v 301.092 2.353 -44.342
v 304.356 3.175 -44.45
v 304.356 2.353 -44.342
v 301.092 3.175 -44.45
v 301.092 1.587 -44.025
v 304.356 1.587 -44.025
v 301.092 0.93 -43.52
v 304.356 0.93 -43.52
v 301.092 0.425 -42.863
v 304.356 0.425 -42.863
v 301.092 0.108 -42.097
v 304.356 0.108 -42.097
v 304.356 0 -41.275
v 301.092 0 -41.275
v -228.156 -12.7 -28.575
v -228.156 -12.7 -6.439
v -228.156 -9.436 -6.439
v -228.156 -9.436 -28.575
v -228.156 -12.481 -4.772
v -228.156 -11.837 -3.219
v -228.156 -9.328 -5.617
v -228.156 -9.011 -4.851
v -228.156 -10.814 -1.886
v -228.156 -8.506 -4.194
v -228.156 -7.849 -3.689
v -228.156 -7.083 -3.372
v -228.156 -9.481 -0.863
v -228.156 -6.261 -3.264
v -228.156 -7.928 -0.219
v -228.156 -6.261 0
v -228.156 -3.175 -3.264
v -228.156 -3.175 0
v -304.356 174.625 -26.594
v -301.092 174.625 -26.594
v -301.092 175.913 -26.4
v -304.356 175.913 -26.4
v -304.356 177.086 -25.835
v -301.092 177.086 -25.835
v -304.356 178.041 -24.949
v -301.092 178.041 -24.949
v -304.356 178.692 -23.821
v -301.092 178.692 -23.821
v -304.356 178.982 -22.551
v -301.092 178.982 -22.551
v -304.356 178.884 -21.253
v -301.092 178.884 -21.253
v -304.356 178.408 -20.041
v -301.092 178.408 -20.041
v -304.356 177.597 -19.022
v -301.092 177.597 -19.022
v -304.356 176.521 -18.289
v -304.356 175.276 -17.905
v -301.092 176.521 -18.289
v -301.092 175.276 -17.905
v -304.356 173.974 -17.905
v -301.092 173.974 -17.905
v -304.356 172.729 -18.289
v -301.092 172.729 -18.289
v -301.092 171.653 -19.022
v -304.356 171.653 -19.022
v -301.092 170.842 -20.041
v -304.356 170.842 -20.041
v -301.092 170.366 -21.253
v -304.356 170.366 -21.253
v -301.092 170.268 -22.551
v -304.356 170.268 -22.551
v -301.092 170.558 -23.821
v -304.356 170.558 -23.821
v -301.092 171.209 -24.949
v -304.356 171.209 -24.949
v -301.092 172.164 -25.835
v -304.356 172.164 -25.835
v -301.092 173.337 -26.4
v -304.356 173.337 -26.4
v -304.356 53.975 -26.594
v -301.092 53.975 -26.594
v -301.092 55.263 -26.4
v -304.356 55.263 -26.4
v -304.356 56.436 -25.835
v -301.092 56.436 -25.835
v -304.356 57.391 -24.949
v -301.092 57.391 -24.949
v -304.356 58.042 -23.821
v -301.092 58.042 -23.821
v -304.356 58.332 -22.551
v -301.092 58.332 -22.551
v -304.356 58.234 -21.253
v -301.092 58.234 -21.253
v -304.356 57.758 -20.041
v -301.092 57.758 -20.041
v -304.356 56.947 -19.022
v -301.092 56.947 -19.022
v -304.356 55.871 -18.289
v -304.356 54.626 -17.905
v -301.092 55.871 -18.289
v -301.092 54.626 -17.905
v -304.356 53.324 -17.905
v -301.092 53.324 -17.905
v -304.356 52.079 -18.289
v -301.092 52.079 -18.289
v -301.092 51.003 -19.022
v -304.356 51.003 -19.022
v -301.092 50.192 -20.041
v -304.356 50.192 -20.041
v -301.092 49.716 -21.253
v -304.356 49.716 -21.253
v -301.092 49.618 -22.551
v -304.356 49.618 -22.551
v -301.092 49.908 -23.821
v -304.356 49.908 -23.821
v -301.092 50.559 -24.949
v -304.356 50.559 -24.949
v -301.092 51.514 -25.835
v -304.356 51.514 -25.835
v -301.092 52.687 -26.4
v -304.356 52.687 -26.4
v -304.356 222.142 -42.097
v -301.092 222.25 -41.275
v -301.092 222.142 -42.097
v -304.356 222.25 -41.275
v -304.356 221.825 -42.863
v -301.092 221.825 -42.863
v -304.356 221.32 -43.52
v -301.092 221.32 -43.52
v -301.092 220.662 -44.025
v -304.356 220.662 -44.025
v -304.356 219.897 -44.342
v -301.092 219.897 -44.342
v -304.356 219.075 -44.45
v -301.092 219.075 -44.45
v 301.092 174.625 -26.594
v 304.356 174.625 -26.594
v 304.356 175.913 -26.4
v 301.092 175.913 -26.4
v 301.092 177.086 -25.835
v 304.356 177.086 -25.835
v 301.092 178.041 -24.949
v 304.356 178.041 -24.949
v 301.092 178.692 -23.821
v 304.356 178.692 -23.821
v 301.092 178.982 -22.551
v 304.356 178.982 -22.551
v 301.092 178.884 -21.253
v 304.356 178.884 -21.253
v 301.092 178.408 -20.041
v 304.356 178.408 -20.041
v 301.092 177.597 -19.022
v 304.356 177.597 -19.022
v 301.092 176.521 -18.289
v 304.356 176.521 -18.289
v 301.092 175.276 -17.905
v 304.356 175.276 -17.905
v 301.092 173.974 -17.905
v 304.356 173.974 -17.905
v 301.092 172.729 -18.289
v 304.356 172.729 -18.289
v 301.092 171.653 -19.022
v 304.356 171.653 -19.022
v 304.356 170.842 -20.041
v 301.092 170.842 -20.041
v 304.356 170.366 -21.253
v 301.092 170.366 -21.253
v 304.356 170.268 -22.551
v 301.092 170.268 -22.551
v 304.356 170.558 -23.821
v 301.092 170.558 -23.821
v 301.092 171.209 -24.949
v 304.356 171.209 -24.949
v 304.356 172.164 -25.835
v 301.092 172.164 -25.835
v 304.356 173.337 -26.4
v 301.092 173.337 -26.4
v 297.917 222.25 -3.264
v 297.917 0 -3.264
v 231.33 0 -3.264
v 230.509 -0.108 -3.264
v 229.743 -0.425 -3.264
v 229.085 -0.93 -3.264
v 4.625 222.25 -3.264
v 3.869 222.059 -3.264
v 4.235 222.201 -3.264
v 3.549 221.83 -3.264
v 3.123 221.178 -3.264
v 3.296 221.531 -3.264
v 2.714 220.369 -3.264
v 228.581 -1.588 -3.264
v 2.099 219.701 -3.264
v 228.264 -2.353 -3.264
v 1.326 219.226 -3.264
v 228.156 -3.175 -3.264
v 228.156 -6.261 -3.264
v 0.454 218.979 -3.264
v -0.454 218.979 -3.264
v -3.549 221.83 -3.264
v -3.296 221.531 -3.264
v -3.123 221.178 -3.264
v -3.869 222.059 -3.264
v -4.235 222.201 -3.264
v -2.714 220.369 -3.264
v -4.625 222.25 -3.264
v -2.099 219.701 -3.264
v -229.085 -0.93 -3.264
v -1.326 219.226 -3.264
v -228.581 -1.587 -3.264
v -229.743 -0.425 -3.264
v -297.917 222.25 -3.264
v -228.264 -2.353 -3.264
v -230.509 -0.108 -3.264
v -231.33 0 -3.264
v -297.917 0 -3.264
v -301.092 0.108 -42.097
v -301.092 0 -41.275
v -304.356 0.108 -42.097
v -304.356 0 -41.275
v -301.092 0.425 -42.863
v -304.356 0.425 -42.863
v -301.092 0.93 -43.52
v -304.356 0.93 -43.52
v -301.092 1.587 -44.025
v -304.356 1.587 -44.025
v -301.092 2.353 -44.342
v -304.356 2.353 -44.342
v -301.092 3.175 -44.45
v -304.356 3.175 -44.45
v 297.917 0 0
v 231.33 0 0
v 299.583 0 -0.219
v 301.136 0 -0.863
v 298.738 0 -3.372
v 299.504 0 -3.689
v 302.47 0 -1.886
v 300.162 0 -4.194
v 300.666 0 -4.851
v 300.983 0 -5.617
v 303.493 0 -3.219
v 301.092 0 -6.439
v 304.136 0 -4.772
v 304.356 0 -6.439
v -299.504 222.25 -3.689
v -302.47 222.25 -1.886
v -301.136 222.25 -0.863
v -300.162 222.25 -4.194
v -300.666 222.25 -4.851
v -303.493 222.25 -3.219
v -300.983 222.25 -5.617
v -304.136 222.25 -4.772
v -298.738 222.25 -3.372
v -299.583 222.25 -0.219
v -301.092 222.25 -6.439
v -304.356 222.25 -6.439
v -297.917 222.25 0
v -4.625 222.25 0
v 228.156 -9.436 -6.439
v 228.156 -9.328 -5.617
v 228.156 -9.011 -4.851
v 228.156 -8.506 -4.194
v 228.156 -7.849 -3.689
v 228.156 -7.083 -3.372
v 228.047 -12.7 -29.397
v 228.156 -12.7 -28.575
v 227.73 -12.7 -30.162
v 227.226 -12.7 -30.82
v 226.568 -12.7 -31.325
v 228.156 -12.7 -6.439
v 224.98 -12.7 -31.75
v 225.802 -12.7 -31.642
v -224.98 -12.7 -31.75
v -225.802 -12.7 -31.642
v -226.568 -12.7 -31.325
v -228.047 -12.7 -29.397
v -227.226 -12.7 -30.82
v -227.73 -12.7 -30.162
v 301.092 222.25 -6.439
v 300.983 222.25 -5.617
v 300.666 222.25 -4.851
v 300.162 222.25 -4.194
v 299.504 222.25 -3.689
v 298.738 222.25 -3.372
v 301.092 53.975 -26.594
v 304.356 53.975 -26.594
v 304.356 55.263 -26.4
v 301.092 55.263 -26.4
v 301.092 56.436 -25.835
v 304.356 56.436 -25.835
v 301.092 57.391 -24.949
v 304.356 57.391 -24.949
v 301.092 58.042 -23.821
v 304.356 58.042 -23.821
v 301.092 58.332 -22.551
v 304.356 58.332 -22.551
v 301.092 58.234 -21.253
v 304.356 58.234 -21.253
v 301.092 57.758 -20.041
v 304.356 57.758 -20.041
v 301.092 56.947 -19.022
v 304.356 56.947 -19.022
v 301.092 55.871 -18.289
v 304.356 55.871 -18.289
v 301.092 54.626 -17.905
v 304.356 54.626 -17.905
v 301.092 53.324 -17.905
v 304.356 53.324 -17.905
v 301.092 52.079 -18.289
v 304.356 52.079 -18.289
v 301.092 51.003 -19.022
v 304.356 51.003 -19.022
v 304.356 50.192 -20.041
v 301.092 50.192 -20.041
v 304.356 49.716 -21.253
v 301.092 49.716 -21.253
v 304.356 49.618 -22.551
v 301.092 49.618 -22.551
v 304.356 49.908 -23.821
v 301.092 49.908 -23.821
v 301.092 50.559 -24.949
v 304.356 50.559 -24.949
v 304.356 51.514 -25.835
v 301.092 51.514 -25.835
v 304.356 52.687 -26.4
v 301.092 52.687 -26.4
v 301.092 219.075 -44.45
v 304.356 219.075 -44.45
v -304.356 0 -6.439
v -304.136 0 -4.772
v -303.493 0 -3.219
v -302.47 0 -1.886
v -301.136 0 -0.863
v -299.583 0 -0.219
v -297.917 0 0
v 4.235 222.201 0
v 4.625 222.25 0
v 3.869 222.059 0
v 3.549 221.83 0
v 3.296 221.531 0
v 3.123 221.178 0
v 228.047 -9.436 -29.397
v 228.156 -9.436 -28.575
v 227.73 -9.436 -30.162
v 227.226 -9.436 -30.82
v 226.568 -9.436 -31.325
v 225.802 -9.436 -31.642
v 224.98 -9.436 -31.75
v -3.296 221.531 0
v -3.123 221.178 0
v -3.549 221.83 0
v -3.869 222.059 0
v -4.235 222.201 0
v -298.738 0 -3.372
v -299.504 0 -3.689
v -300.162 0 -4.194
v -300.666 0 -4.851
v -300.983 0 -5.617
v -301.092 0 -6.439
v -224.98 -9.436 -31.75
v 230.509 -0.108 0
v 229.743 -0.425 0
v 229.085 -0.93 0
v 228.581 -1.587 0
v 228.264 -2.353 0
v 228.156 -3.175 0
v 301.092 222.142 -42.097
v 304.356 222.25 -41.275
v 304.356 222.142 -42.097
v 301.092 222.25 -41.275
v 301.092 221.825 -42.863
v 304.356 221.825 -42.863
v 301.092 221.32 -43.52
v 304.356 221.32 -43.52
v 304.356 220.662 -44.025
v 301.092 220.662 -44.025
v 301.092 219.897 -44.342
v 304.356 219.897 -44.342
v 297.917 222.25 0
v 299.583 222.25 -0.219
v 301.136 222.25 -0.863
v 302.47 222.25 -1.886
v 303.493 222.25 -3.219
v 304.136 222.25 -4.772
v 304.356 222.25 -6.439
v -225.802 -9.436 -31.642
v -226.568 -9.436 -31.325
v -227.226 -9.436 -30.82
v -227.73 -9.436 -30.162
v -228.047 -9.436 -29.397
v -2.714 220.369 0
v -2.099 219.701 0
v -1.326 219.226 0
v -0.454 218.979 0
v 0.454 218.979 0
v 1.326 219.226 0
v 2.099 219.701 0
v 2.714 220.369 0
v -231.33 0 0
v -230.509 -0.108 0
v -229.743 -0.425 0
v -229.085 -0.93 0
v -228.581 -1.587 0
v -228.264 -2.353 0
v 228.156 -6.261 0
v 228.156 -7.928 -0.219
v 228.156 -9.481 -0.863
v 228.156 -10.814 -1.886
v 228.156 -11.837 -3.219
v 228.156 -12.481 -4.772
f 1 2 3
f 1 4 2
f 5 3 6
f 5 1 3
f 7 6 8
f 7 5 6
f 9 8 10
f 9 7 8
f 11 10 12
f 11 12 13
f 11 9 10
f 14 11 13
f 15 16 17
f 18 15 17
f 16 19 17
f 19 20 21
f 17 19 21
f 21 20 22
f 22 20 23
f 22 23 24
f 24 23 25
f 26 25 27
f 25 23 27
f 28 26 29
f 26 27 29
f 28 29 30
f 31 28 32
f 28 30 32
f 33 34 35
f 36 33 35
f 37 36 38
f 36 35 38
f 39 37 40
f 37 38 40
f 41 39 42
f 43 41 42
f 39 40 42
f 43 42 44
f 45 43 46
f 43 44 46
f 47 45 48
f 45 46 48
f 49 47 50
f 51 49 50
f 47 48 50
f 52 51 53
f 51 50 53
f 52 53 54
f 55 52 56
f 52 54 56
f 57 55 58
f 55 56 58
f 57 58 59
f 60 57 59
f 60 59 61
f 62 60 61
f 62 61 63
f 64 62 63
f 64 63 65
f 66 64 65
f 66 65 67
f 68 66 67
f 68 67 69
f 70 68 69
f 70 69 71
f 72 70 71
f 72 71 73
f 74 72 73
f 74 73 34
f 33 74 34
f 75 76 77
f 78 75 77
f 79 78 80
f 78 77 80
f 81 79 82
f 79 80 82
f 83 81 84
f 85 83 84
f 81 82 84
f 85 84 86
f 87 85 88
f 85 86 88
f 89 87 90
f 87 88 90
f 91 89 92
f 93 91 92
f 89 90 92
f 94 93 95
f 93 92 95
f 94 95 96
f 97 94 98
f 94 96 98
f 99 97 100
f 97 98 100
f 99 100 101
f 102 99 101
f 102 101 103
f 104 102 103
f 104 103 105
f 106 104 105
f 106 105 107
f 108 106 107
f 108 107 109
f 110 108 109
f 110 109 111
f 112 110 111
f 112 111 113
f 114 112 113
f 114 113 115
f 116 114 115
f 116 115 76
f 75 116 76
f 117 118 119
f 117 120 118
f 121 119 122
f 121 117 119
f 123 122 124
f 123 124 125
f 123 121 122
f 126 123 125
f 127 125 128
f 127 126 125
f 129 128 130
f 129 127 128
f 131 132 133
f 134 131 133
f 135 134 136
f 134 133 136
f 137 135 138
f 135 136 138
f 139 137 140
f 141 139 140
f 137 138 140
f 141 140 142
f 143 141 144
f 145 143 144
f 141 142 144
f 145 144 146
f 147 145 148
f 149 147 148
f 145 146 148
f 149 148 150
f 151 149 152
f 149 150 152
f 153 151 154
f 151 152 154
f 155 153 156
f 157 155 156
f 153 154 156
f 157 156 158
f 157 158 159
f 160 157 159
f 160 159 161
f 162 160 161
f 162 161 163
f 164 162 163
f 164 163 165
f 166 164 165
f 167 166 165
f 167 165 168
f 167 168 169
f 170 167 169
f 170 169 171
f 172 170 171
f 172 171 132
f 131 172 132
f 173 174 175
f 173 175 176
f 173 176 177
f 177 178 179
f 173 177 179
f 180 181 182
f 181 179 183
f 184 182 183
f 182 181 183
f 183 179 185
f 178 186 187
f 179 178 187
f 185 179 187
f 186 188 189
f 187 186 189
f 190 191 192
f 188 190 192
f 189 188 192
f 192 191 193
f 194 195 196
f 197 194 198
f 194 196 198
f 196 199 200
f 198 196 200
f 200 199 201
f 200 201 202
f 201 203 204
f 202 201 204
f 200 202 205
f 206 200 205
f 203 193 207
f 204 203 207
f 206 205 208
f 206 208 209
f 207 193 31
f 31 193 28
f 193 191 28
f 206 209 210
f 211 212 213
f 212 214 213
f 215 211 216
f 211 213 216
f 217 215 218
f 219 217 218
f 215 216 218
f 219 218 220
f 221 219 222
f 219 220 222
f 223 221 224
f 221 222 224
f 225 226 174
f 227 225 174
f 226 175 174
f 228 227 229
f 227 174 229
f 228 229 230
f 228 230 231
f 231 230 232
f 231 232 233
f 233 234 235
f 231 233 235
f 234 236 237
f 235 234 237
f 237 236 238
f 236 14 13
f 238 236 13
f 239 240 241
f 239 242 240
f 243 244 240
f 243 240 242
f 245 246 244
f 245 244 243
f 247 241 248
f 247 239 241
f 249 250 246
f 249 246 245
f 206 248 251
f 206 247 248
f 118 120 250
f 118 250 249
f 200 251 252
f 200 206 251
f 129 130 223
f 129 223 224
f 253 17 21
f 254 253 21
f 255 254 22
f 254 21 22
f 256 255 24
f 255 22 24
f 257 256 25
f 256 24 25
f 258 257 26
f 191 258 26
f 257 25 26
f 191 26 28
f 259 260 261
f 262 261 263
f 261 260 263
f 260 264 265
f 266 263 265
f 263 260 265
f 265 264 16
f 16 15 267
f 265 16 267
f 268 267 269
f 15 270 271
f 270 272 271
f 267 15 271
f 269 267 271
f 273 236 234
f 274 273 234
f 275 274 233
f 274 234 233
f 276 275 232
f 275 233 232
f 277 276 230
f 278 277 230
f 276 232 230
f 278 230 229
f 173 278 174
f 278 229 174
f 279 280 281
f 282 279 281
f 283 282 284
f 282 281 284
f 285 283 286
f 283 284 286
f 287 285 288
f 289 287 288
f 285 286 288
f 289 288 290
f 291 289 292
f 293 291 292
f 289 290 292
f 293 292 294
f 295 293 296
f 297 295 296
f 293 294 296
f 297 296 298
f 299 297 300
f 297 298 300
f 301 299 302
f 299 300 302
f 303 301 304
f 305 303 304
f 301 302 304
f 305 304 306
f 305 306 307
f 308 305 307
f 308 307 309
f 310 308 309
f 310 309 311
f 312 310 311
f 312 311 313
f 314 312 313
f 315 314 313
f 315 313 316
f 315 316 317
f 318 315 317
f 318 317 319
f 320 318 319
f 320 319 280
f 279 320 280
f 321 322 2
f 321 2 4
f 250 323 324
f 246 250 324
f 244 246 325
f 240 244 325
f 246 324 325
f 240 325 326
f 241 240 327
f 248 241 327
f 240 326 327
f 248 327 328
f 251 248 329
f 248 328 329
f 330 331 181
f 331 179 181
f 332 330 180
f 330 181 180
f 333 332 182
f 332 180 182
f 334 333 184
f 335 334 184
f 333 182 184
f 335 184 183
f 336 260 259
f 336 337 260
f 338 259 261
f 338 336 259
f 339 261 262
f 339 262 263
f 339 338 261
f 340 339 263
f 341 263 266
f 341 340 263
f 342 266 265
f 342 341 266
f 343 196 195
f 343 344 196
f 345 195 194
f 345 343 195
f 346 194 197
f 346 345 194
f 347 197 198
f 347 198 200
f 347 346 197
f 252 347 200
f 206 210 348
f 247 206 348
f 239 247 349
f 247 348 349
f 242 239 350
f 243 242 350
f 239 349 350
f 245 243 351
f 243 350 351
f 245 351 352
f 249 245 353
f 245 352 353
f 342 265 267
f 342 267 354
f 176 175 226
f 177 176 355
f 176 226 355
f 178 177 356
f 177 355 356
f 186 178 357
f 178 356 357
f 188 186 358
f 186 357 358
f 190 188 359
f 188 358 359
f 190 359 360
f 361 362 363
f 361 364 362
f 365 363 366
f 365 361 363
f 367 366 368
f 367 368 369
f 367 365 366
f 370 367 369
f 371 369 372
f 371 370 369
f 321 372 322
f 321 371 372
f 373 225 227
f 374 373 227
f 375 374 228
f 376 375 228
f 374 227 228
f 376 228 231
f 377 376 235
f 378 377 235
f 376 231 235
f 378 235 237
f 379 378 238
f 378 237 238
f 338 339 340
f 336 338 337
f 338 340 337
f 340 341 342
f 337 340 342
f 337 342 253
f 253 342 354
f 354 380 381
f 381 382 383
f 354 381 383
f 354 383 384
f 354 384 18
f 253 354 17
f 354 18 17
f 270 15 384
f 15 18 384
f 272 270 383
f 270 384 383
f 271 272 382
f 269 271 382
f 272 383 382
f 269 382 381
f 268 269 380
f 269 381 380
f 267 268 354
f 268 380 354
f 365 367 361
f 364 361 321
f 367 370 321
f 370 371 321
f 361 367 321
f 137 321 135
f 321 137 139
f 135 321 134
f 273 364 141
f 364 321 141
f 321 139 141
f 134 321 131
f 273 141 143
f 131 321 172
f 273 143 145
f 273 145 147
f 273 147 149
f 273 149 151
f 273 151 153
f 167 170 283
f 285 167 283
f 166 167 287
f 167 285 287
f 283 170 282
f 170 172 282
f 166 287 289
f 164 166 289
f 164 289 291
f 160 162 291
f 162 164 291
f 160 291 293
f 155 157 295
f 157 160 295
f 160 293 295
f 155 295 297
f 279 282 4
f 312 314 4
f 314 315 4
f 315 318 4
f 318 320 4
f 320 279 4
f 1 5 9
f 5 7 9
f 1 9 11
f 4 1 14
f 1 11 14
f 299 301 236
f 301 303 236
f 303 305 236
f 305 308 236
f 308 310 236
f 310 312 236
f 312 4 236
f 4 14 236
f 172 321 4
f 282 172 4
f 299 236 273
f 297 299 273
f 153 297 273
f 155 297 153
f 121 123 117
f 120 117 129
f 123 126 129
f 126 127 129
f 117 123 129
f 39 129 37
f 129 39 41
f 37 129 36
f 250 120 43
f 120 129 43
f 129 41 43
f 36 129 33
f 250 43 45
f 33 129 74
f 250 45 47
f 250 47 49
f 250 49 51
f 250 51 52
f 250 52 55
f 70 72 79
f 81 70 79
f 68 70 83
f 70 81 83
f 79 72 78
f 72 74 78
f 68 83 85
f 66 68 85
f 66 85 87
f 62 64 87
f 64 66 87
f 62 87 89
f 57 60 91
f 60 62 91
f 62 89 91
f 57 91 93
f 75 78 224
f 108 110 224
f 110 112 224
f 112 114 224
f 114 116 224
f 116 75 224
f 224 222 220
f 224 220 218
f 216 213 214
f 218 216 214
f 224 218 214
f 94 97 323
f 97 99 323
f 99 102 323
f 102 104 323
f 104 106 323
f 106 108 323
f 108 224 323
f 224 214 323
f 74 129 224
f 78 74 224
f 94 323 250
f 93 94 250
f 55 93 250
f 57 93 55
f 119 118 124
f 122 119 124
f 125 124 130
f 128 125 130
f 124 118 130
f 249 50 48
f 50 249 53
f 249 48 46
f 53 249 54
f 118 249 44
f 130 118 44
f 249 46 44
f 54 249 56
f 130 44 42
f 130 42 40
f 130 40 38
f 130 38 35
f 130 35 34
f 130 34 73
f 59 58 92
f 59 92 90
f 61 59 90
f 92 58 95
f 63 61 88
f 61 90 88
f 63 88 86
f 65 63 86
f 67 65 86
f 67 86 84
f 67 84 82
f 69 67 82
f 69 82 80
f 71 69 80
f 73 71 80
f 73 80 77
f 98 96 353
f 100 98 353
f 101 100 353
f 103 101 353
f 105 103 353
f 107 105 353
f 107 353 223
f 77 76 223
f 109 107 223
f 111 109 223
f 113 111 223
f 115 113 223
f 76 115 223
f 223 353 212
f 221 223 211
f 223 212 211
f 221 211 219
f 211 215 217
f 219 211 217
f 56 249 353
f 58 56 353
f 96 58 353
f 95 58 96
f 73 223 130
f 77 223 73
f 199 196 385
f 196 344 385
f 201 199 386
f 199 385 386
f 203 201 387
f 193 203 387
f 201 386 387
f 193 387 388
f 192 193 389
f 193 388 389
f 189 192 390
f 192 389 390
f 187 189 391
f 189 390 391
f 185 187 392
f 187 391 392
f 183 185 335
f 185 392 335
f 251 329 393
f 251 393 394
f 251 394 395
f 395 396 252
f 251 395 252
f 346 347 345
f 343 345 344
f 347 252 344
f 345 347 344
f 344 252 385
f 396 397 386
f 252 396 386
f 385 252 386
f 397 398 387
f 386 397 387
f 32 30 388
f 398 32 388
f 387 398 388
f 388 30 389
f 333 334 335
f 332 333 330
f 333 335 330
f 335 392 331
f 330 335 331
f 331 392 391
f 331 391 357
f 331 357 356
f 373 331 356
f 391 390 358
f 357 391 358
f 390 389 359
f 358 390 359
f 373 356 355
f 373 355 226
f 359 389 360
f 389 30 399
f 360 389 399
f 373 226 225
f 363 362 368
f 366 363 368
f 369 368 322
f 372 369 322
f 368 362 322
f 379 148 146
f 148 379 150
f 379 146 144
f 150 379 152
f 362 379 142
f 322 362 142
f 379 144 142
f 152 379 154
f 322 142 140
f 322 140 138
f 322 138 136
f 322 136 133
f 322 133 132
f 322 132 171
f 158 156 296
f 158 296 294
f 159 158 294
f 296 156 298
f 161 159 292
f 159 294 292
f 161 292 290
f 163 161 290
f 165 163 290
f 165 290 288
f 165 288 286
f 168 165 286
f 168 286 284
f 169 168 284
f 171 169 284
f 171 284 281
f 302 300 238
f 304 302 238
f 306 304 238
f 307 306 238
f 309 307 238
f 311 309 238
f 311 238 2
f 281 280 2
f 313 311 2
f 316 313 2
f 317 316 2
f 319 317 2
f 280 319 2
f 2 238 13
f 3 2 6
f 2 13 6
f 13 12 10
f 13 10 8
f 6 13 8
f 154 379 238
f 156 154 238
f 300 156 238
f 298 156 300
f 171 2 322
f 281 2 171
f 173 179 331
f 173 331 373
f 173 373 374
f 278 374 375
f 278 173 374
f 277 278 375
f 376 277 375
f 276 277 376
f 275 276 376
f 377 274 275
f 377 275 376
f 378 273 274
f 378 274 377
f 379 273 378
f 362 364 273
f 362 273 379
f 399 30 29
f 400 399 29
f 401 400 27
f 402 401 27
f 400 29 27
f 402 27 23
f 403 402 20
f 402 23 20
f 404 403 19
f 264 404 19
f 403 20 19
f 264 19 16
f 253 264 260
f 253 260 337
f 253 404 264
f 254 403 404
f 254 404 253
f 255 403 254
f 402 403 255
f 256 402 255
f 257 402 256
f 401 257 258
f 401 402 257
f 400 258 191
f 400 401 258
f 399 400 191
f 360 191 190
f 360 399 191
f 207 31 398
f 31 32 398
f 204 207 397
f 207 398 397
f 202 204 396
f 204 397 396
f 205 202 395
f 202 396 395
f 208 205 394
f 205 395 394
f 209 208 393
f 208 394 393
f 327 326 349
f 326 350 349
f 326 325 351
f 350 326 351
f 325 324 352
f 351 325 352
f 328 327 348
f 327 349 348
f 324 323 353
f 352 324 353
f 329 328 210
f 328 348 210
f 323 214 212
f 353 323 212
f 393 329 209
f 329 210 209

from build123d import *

# Parameters (mm, degrees)
BASE_FLANGE1_DEPTH                        = 222.25
HOLE_FOR_1_4_SELF_CLINCHING_NUTS_S_SS_C_D = 8.7376
EDGE_FLANGE1_START                        = -228.1555
EDGE_FLANGE1_DEPTH                        = 456.311
SKETCH14_R                                = 3.302
CUT_EXTRUDE2_DEPTH                        = 380.477450424
FILLET1_R                                 = 1.5875
FILLET2_R                                 = 3.175


# Read off the part's stored shape, not the designer's step: Base-Flange1, Edge-Flange1
with BuildPart() as part:
    # Base-Flange1 outline → Base-Flange1 (new body)
    with BuildSketch(Plane(origin=(0, 0, 0), x_dir=(1, 0, 0), z_dir=(0, 1, 0))):
        with BuildLine():
            Line((304.3555, 6.4389), (304.3555, 44.45))
            Line((304.3555, 44.45), (301.0916, 44.45))
            Line((301.0916, 44.45), (301.0916, 6.4389))
            ThreePointArc((301.0916, 6.4389), (300.16166403, 4.19383597), (297.9166, 3.2639))
            Line((297.9166, 3.2639), (-297.9166, 3.2639))
            ThreePointArc((-297.9166, 3.2639), (-300.16166403, 4.19383597), (-301.0916, 6.4389))
            Line((-301.0916, 6.4389), (-301.0916, 44.45))
            Line((-301.0916, 44.45), (-304.3555, 44.45))
            Line((-304.3555, 44.45), (-304.3555, 6.4389))
            ThreePointArc((-304.3555, 6.4389), (-302.469589853, 1.885910147), (-297.9166, 0))
            Line((-297.9166, 0), (297.9166, 0))
            ThreePointArc((297.9166, 0), (302.469589853, 1.885910147), (304.3555, 6.4389))
        make_face()
    extrude(amount=BASE_FLANGE1_DEPTH)

    # Hole for 1/4 Self-clinching Nuts (S,SS,CLS,CLSS)1 (through all)
    with Locations(Plane.ZY.offset(304.3555)):
        with Locations((-22.225, 174.625), (-22.225, 53.975)):
            Hole(HOLE_FOR_1_4_SELF_CLINCHING_NUTS_S_SS_C_D / 2)

    # Edge-Flange1 outline → Edge-Flange1 (add)
    with BuildSketch(Plane.YZ.offset(EDGE_FLANGE1_START)):
        with BuildLine():
            ThreePointArc((-6.2611, 0), (-10.814089853, -1.885910147), (-12.7, -6.4389))
            Line((-12.7, -6.4389), (-12.7, -31.75))
            Line((-12.7, -31.75), (-9.4361, -31.75))
            Line((-9.4361, -31.75), (-9.4361, -6.4389))
            ThreePointArc((-9.4361, -6.4389), (-8.50616403, -4.19383597), (-6.2611, -3.2639))
            Line((-6.2611, -3.2639), (0, -3.2639))
            Line((0, -3.2639), (0, 0))
            Line((0, 0), (-6.2611, 0))
        make_face()
    extrude(amount=EDGE_FLANGE1_DEPTH)

    # Sketch14 → Cut-Extrude2 (cut, through all)
    with BuildSketch(Plane.XY):
        with Locations((0, 222.25)):
            Circle(SKETCH14_R)
    extrude(amount=-CUT_EXTRUDE2_DEPTH, mode=Mode.SUBTRACT)

    # Fillet1
    fillet1_edges = [part.edges().sort_by_distance(p)[0] for p in [
        (-3.302, 222.25, -1.63195),
        (3.302, 222.25, -1.63195),
    ]]
    fillet(fillet1_edges, radius=FILLET1_R)

    # Fillet2
    fillet2_edges = [part.edges().sort_by_distance(p)[0] for p in [
        (-302.72355, 0, -44.45),
        (302.72355, 0, -44.45),
        (-302.72355, 222.25, -44.45),
        (228.1555, 0, -1.63195),
        (-228.1555, 0, -1.63195),
        (228.1555, -11.06805, -31.75),
        (-228.1555, -11.06805, -31.75),
        (302.72355, 222.25, -44.45),
    ]]
    fillet(fillet2_edges, radius=FILLET2_R)


solid = part.part
